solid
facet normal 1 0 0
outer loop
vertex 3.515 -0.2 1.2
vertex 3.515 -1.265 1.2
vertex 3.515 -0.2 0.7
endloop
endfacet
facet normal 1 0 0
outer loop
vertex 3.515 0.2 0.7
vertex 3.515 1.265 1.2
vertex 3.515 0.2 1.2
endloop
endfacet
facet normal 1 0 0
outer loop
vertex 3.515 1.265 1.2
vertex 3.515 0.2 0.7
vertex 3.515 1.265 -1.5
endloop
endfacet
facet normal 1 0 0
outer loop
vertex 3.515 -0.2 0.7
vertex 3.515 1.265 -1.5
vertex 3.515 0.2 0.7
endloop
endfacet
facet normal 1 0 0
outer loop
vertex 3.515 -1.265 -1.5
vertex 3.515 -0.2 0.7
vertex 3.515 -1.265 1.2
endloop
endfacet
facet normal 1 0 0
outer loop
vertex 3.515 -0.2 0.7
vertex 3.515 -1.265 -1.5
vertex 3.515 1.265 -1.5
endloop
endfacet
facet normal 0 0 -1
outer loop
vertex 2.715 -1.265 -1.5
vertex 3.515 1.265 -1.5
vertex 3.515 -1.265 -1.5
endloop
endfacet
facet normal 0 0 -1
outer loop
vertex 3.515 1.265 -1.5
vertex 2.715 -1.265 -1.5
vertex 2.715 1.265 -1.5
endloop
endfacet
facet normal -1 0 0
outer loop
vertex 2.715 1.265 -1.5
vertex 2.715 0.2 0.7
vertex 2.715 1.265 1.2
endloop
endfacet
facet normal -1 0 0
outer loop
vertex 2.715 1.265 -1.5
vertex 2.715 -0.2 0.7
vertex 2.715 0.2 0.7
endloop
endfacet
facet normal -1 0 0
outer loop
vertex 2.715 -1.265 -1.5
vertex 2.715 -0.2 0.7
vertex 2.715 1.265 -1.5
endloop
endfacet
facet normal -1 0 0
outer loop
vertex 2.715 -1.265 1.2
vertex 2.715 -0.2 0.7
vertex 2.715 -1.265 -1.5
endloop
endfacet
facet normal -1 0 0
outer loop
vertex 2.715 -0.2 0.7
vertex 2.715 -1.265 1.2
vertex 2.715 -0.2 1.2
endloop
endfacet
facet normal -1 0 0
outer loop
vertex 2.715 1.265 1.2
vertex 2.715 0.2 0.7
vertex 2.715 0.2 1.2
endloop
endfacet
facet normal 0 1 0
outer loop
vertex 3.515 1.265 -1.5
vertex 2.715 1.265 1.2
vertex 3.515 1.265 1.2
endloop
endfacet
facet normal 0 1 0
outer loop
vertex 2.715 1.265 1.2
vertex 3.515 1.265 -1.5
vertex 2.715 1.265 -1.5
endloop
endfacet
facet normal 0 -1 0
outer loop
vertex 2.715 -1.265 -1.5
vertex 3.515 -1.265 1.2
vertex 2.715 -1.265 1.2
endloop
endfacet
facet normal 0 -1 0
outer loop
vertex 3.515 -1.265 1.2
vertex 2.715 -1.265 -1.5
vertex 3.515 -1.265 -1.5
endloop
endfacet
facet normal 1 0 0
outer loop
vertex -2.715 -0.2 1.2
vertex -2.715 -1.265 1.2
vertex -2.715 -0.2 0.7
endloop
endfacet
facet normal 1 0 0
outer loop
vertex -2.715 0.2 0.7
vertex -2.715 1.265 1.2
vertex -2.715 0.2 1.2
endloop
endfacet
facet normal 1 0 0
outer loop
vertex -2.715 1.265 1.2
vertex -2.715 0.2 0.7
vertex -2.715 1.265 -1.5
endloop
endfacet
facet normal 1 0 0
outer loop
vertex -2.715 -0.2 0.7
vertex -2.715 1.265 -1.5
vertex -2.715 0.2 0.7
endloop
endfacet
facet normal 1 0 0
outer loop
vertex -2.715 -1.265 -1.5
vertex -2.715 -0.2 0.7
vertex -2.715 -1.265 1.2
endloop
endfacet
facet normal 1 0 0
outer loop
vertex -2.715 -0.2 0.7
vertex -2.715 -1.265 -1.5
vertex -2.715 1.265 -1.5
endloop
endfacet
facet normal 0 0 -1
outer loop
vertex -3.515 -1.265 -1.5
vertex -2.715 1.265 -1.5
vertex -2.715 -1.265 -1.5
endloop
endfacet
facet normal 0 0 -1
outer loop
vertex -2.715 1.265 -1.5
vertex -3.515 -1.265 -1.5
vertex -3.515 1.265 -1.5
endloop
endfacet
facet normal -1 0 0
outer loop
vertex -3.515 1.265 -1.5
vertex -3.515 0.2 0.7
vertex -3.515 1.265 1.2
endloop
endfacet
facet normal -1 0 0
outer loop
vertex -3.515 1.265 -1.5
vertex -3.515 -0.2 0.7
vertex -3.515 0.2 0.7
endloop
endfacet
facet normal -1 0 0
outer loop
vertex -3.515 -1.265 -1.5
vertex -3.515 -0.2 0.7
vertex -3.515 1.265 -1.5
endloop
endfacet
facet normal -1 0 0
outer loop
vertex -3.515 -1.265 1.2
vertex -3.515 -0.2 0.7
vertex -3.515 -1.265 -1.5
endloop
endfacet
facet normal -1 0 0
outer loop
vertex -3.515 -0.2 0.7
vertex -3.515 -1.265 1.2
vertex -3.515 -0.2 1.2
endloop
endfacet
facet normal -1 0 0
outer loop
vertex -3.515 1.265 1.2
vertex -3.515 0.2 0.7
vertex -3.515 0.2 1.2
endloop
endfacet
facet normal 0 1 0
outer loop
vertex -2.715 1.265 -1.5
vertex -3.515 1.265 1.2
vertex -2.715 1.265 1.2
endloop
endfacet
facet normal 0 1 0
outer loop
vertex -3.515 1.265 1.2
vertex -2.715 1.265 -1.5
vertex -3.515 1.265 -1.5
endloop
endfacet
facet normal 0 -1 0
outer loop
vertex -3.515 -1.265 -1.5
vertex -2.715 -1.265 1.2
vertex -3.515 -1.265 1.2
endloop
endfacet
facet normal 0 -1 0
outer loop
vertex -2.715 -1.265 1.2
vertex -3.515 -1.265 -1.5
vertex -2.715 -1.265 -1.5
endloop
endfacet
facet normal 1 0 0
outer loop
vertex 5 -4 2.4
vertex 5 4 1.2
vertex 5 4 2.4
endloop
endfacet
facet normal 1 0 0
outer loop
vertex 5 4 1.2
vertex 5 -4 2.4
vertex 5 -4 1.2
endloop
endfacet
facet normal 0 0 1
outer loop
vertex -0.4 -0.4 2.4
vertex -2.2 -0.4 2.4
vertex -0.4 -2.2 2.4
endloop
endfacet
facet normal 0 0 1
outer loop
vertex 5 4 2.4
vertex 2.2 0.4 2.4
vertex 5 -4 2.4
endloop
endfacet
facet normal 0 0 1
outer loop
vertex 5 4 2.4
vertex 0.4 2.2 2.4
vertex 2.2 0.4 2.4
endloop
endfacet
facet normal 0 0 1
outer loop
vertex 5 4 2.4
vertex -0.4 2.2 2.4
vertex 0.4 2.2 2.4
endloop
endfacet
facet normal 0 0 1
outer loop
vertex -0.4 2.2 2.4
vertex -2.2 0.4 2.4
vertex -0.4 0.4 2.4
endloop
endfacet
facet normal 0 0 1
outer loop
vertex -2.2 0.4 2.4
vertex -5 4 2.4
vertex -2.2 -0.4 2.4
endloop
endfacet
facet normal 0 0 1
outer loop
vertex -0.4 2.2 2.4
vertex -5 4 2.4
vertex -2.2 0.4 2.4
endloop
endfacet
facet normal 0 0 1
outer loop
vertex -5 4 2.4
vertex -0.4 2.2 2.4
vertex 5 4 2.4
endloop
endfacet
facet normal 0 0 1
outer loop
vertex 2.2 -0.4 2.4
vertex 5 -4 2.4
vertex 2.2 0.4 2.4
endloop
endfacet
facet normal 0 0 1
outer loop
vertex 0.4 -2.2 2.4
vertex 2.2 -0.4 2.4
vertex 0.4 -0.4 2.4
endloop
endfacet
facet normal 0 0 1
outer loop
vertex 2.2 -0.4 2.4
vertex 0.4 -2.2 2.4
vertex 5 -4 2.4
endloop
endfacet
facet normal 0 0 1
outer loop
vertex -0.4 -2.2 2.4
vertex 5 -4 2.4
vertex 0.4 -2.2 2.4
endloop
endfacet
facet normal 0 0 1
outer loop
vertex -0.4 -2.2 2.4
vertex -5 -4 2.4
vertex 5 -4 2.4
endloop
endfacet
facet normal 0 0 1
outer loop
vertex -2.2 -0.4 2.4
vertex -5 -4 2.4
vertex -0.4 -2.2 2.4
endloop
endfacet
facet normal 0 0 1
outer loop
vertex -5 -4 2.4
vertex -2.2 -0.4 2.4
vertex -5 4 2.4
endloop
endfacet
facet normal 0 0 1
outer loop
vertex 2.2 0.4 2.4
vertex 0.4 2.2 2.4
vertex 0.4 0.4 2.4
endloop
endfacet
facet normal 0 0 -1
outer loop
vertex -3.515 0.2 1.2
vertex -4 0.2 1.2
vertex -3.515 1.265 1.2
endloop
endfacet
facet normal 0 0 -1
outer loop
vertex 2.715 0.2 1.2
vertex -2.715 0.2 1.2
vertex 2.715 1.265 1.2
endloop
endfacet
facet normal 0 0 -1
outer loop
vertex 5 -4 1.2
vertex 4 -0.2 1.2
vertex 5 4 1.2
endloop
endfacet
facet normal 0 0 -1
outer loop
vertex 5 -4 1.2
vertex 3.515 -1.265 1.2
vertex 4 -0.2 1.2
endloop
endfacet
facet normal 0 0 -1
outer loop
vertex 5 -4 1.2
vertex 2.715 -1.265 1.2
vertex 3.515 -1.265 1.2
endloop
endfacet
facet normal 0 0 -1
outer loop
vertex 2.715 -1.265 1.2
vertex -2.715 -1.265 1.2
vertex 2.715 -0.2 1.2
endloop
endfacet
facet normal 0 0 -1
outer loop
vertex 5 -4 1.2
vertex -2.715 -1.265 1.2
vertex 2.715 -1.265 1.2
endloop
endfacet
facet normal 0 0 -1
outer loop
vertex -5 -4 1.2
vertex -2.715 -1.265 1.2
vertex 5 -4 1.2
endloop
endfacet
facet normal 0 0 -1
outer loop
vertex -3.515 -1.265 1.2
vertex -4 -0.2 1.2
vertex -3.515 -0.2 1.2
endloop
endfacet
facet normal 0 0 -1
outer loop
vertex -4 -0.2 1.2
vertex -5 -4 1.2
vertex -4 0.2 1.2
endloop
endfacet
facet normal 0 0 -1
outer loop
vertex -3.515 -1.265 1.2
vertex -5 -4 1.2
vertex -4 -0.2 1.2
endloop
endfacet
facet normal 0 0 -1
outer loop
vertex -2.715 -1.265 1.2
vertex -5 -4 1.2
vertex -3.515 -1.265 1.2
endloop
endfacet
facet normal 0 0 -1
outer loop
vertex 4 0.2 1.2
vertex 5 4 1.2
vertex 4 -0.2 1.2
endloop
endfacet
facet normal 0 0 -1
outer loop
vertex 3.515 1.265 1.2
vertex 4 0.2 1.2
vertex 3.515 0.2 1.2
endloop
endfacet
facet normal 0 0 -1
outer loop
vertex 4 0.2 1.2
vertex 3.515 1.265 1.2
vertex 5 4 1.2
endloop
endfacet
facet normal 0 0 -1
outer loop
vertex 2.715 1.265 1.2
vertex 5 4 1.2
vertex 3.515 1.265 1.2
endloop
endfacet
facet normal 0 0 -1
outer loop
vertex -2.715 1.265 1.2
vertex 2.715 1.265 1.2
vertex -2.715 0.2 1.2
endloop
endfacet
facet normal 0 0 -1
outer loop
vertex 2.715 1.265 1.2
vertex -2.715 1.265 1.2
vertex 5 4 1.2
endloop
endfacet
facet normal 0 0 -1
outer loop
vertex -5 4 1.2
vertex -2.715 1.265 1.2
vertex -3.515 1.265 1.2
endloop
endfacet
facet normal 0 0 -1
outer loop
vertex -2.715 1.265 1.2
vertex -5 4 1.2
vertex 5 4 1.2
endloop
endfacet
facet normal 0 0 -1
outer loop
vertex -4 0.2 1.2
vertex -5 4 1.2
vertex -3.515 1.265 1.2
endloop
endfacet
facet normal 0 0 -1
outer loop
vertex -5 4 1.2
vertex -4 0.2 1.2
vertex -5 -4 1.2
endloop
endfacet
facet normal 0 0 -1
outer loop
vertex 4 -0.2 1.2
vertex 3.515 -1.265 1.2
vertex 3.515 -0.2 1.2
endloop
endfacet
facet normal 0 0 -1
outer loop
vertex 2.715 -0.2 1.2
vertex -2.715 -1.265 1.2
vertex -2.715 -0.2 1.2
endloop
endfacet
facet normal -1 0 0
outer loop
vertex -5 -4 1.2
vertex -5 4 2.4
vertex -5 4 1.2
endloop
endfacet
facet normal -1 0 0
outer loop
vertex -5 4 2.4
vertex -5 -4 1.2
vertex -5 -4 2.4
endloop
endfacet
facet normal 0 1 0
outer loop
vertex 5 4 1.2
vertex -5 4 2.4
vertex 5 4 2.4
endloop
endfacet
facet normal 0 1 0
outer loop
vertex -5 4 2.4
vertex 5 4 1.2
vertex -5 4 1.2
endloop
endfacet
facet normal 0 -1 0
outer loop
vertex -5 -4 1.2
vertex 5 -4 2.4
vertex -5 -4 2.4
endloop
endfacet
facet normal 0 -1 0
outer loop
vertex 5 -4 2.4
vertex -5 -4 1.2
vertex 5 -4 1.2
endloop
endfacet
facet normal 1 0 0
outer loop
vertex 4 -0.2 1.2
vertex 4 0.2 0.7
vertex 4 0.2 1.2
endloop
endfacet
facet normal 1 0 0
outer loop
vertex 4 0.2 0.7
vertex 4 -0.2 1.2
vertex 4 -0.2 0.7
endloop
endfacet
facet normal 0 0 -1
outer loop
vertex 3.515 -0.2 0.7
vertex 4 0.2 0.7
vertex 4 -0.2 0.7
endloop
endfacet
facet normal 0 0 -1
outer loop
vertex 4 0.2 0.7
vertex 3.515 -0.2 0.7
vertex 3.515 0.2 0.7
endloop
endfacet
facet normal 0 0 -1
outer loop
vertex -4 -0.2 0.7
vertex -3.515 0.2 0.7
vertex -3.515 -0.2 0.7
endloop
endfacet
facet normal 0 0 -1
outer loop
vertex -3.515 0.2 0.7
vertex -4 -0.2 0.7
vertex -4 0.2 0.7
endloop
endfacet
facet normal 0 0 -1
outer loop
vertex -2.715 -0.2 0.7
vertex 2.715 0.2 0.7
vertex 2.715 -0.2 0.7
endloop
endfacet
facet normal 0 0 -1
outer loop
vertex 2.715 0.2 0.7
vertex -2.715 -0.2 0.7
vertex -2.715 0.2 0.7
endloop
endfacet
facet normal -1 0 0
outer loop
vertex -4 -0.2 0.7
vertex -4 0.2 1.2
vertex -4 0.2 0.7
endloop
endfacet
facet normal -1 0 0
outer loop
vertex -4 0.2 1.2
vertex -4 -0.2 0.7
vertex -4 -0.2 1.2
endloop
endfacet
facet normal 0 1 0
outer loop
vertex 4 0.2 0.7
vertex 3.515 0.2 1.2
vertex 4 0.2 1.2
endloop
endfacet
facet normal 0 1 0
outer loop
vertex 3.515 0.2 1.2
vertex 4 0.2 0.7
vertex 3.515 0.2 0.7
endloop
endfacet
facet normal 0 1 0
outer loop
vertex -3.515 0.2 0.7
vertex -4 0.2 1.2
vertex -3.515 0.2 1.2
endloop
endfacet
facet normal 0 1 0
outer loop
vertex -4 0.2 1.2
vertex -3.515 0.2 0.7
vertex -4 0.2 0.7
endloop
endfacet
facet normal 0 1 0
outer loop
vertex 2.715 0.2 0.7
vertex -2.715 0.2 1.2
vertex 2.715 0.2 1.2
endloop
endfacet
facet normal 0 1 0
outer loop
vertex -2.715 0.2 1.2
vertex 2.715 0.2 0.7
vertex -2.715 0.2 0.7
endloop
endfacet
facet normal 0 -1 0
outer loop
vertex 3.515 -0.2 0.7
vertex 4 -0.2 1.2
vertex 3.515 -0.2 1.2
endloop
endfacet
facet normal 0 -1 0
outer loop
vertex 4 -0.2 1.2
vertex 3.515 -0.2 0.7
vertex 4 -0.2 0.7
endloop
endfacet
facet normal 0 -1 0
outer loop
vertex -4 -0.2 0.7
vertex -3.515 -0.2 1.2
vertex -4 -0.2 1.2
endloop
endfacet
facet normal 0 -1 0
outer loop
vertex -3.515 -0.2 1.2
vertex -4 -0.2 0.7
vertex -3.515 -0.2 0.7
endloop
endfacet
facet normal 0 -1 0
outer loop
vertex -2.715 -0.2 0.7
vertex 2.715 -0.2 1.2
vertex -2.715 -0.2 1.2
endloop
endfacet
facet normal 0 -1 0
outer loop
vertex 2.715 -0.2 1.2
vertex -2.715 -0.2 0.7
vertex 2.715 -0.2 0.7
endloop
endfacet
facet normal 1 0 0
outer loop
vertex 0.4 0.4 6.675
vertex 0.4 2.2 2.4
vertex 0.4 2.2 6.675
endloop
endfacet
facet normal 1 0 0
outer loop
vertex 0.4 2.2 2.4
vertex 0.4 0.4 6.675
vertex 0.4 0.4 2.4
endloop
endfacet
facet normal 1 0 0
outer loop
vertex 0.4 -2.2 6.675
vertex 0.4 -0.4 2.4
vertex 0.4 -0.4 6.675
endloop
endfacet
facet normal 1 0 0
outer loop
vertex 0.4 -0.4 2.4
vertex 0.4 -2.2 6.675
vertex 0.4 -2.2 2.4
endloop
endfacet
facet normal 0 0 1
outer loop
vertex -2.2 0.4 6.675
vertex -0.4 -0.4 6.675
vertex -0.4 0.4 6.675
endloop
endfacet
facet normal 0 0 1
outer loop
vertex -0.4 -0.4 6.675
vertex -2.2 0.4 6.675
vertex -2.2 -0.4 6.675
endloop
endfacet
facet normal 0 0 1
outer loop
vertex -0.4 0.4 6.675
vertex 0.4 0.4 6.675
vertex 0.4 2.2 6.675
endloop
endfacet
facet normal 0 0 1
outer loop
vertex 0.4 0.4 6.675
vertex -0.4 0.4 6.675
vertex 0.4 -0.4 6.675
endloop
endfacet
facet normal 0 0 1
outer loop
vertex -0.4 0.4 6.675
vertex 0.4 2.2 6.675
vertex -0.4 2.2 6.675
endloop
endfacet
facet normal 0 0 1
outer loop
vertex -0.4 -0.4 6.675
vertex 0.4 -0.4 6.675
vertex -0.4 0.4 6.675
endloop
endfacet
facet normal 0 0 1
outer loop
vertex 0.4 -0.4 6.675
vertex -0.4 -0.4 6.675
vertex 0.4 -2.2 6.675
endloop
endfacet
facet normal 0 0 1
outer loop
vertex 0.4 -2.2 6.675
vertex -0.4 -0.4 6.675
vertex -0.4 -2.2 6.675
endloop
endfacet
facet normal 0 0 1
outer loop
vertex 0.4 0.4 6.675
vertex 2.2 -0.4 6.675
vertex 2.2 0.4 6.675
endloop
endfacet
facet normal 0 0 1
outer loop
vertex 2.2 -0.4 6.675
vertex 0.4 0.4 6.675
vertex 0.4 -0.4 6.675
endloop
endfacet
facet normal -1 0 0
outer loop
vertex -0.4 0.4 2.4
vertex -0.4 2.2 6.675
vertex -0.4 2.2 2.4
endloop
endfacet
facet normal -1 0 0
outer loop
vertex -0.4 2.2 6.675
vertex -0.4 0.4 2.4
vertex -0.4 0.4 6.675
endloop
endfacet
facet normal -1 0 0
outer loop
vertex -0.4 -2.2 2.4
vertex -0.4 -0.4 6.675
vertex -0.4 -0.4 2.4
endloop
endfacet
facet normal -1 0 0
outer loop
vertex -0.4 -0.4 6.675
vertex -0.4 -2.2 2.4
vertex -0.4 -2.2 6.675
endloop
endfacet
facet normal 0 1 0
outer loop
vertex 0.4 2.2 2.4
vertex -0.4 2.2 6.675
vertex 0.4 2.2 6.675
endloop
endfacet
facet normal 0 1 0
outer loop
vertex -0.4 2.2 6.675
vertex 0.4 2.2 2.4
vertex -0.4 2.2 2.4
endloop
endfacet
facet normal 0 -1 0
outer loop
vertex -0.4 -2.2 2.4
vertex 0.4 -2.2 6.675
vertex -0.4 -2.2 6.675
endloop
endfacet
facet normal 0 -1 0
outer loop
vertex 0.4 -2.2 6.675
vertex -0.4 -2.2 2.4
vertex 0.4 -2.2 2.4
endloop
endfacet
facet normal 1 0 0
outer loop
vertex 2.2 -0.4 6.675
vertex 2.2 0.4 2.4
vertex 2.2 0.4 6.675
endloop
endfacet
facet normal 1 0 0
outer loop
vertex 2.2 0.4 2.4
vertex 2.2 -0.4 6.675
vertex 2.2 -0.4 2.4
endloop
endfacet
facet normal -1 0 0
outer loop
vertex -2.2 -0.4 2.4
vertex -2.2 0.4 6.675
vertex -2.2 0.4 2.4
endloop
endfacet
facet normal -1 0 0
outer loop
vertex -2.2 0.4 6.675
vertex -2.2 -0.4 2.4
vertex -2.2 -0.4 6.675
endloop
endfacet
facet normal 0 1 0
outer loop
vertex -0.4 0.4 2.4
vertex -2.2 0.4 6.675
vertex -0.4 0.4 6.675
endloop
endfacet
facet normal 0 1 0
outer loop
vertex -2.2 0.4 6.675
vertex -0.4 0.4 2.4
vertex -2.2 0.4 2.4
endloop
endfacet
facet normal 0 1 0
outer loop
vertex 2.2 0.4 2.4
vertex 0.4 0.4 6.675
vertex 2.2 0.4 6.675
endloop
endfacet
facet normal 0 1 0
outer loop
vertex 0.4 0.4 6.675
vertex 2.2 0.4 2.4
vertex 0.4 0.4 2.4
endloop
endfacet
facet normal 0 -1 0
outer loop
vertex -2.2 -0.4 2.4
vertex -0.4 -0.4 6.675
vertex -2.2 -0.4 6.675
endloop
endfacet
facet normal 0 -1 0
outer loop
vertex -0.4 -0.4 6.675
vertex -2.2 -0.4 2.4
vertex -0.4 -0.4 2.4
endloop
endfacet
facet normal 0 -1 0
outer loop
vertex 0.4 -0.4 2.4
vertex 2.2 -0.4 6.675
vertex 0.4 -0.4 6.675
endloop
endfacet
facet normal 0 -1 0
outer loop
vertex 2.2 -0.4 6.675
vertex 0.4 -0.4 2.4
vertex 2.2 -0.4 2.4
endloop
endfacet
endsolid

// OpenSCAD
union () {
  union () {
    translate ([3.1149999999999998, 0, 0]) {
      cube ([0.8, 2.53, 3.0], center=true);
    }
    translate ([-3.1149999999999998, 0, 0]) {
      cube ([0.8, 2.53, 3.0], center=true);
    }
  }
  translate ([0, 0, 1.8]) {
    union () {
      cube ([10.0, 8.0, 1.2], center=true);
      translate ([0, 0, -0.6]) {
        cube ([8.0, 0.4, 1.0], center=true);
      }
    }
  }
  translate ([0, 0, 4.2]) {
    union () {
      cube ([0.8, 4.4, 4.95], center=true);
      cube ([4.4, 0.8, 4.95], center=true);
    }
  }
}
